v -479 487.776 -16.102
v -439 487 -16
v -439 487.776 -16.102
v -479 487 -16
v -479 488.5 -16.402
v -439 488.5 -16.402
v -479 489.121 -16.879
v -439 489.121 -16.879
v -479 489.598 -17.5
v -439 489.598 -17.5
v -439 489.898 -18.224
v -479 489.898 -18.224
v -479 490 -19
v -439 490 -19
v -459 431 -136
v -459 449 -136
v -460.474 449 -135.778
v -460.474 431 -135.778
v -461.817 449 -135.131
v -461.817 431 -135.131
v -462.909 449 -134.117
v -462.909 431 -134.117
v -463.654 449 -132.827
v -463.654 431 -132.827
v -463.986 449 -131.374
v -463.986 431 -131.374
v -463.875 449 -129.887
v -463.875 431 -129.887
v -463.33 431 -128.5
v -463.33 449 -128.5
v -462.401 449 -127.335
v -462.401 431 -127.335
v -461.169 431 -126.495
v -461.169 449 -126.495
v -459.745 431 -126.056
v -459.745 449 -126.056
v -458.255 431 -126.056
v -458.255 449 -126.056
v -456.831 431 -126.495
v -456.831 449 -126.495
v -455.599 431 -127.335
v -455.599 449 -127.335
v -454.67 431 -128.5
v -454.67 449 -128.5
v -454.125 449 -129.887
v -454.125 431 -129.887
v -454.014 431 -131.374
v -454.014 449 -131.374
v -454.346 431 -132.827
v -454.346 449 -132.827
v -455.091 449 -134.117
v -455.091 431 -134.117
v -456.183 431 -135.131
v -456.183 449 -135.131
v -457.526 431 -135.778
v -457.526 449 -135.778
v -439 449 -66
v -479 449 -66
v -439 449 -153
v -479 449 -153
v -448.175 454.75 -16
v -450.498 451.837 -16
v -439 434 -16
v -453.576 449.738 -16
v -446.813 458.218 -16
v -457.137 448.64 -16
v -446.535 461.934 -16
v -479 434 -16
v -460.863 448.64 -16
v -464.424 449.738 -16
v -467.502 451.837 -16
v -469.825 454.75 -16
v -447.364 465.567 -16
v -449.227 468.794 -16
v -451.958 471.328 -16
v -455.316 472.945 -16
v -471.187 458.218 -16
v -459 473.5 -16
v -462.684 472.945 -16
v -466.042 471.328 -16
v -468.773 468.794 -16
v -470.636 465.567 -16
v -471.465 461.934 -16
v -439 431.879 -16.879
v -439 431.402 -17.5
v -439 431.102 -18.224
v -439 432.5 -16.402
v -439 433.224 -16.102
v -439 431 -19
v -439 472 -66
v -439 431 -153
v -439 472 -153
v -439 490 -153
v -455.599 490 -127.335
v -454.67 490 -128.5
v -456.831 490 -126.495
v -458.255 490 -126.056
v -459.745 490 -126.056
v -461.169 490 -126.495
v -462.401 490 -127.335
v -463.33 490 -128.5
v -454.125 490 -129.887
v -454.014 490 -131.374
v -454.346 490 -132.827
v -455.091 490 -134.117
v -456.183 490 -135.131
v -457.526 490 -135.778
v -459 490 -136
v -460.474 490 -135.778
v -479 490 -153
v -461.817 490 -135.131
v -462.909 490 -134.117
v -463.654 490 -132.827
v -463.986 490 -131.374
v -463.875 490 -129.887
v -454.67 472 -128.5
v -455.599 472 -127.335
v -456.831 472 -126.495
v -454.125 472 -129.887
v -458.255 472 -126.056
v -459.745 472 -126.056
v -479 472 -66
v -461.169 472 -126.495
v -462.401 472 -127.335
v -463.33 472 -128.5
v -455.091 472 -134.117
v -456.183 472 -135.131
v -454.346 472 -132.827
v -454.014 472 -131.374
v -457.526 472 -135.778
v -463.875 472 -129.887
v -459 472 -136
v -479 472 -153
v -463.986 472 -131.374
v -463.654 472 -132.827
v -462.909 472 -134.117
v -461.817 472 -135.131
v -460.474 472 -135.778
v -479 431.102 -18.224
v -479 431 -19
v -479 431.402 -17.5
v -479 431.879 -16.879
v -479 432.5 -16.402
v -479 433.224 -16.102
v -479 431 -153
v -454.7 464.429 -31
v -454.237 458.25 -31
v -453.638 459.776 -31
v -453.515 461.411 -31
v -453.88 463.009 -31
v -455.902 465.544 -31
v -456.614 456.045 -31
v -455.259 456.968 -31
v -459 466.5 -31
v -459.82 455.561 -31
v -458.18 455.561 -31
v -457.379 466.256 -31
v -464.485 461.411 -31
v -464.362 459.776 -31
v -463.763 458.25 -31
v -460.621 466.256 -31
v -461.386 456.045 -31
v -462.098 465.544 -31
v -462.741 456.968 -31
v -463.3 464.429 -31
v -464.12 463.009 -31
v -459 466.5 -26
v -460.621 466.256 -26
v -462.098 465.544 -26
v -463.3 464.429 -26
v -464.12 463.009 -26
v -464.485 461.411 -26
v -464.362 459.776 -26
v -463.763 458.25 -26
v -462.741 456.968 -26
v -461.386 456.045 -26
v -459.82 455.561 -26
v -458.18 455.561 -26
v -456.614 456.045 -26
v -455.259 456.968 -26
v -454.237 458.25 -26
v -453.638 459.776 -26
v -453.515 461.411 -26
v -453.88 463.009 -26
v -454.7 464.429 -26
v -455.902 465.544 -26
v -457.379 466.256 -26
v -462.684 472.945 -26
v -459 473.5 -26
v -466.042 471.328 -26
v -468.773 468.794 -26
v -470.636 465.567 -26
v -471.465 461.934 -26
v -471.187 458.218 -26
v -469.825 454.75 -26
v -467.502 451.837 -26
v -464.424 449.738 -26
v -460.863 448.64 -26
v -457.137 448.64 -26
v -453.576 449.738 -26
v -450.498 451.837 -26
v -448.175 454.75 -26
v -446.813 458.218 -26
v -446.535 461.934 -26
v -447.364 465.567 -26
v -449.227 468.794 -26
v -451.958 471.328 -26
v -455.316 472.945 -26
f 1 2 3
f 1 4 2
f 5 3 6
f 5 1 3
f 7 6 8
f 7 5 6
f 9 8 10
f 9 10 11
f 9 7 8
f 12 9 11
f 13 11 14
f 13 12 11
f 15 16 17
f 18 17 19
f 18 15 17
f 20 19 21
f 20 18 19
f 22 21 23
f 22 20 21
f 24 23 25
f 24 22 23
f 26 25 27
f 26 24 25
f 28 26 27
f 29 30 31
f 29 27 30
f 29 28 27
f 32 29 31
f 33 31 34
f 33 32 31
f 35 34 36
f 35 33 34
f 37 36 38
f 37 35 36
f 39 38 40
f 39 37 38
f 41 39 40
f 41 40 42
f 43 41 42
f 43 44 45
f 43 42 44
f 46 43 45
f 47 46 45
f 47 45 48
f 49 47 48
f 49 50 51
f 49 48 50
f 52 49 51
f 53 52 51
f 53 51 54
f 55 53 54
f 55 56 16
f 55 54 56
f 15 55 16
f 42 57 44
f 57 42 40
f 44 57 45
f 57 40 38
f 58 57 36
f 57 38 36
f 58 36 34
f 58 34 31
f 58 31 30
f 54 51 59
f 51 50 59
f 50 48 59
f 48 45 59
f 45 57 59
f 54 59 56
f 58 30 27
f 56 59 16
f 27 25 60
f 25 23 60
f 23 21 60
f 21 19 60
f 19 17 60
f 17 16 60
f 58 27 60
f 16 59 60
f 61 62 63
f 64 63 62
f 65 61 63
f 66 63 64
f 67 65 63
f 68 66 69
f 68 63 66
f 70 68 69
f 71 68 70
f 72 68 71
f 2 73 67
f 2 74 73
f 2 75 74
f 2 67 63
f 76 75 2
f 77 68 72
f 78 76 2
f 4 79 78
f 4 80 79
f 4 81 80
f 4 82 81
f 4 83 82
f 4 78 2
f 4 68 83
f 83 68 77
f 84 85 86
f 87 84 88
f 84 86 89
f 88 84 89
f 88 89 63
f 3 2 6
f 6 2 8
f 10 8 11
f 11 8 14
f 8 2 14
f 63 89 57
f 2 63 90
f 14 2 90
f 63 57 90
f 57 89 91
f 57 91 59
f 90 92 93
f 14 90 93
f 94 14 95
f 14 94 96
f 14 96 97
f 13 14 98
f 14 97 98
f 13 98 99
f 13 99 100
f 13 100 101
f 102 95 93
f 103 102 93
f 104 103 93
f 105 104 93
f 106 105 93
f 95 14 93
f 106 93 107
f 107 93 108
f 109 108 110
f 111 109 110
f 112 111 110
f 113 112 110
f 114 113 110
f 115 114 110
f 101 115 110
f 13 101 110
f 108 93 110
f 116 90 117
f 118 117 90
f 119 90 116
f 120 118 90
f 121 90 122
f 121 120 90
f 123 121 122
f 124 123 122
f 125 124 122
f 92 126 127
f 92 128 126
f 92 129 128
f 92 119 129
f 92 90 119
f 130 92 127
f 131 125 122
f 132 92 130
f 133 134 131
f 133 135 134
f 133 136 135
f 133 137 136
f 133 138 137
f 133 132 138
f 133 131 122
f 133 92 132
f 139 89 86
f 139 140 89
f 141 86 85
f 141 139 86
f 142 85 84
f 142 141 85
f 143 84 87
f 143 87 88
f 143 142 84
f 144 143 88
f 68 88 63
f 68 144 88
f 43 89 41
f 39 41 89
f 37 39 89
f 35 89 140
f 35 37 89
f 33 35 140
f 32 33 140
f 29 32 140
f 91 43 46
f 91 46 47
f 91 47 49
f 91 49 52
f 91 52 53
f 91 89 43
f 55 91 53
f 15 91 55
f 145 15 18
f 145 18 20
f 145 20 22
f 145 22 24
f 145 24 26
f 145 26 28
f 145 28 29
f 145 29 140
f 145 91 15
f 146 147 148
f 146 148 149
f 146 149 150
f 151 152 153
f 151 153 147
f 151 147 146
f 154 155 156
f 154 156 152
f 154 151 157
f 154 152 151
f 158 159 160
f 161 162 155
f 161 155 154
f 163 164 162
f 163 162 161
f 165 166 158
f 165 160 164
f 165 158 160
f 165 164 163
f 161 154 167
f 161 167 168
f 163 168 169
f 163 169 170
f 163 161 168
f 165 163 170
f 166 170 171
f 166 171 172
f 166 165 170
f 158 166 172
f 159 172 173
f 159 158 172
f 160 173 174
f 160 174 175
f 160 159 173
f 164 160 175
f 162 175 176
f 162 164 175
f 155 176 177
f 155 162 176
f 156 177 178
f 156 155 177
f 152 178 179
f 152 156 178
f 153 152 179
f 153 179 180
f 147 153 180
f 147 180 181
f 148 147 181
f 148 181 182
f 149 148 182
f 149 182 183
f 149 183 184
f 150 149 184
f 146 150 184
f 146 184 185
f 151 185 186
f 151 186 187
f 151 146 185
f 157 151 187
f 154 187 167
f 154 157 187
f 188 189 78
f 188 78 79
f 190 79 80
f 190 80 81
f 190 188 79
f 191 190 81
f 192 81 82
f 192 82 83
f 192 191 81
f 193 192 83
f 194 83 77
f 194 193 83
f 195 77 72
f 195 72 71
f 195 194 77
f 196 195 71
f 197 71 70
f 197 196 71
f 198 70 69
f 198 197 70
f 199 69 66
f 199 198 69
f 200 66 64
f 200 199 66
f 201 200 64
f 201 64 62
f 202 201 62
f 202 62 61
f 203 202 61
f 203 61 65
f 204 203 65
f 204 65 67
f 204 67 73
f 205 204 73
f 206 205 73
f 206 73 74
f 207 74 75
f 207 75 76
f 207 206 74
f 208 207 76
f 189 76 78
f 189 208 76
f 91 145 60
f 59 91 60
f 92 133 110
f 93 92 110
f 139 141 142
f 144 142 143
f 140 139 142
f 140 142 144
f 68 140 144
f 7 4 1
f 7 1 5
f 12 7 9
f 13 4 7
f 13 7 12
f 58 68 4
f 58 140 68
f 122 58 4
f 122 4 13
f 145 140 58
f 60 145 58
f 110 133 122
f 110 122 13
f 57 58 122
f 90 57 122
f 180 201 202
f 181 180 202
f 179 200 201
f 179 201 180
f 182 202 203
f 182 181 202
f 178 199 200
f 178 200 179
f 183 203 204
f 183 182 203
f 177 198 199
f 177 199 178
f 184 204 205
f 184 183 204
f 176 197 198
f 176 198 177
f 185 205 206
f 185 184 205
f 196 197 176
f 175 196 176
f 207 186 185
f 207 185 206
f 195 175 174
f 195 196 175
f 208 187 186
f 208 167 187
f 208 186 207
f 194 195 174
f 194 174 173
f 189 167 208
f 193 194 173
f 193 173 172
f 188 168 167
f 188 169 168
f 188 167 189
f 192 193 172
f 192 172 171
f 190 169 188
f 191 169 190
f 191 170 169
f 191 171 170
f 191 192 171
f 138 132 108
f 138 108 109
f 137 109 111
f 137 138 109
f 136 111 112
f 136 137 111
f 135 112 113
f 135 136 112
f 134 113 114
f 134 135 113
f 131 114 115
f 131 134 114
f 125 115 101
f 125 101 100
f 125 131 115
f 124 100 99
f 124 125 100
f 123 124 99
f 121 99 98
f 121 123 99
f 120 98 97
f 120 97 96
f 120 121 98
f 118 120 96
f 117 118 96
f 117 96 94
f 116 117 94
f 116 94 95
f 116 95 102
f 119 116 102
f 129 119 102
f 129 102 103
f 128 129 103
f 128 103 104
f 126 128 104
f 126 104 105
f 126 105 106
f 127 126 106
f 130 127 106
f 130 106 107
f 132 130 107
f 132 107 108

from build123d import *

# Parameters (mm, degrees)
CYLINDER244_R           = 5.5
CYLINDER244_DEPTH       = 5
CYLINDER243_R           = 12.5
CYLINDER243_DEPTH       = 10
CYLINDER242_R           = 5
CYLINDER242_DEPTH       = 59
CYLINDER242_PITCH_ANGLE = 90
BOX124_W                = 23
BOX124_H                = 40
BOX124_DEPTH            = 87
BOX123_W                = 59
BOX123_H                = 40
BOX123_DEPTH            = 137
CUT269_PLACEMENT_ANGLE  = 90
FILLET_R                = 3


with BuildPart() as cilindro139:
    # Cylinder244 → Cylinder244 (new body)
    with BuildSketch(Plane(origin=(30, 15, 122), x_dir=(1, 0, 0), z_dir=(0, 0, 1))):
        Circle(CYLINDER244_R)
    extrude(amount=CYLINDER244_DEPTH)


with BuildPart() as cilindro138:
    # Cylinder243 → Cylinder243 (new body)
    with BuildSketch(Plane(origin=(30, 15, 127), x_dir=(1, 0, 0), z_dir=(0, 0, 1))):
        Circle(CYLINDER243_R)
    extrude(amount=CYLINDER243_DEPTH)


with BuildPart() as cilindro137:
    # Cylinder242 → Cylinder242 (new body)
    with BuildSketch(Plane.XY):
        Circle(CYLINDER242_R)
    extrude(amount=CYLINDER242_DEPTH)


with BuildPart() as cilindro137_1:
    # Cylinder242 pitch: moved
    add(cilindro137.part.rotate(Axis((0, 0, 0), (0, 1, 0)), CYLINDER242_PITCH_ANGLE))


with BuildPart() as cilindro137_2:
    # Cylinder242 placement: moved
    add(cilindro137_1.part.moved(Location((0, 15, 22))))


with BuildPart() as cubo086:
    # Box124 → Box124 (new body)
    with BuildSketch(Plane(origin=(18, -5, 0), x_dir=(1, 0, 0), z_dir=(0, 0, 1))):
        with Locations((11.5, 20)):
            Rectangle(BOX124_W, BOX124_H)
    extrude(amount=BOX124_DEPTH)


with BuildPart() as fillet_body:
    # Box123 → Box123 (new body)
    with BuildSketch(Plane(origin=(0, -5, 0), x_dir=(1, 0, 0), z_dir=(0, 0, 1))):
        with Locations((29.5, 20)):
            Rectangle(BOX123_W, BOX123_H)
    extrude(amount=BOX123_DEPTH)

    # Cut266: cut Cubo086
    add(cubo086.part, mode=Mode.SUBTRACT)

    # Cut267: cut Cilindro137
    add(cilindro137_2.part, mode=Mode.SUBTRACT)

    # Cut268: cut Cilindro138
    add(cilindro138.part, mode=Mode.SUBTRACT)

    # Cut269: cut Cilindro139
    add(cilindro139.part, mode=Mode.SUBTRACT)


with BuildPart() as fillet_body_1:
    # Cut269 placement: moved
    add(fillet_body.part.moved(Location((-444, 431, -153))).rotate(Axis((-444, 431, -153), (0, 0, 1)), CUT269_PLACEMENT_ANGLE))

    # Fillet
    fillet_edges = [fillet_body_1.edges().sort_by_distance(p)[0] for p in [
        (-459, 431, -16),
        (-459, 490, -16),
    ]]
    fillet(fillet_edges, radius=FILLET_R)


solid = fillet_body_1.part
